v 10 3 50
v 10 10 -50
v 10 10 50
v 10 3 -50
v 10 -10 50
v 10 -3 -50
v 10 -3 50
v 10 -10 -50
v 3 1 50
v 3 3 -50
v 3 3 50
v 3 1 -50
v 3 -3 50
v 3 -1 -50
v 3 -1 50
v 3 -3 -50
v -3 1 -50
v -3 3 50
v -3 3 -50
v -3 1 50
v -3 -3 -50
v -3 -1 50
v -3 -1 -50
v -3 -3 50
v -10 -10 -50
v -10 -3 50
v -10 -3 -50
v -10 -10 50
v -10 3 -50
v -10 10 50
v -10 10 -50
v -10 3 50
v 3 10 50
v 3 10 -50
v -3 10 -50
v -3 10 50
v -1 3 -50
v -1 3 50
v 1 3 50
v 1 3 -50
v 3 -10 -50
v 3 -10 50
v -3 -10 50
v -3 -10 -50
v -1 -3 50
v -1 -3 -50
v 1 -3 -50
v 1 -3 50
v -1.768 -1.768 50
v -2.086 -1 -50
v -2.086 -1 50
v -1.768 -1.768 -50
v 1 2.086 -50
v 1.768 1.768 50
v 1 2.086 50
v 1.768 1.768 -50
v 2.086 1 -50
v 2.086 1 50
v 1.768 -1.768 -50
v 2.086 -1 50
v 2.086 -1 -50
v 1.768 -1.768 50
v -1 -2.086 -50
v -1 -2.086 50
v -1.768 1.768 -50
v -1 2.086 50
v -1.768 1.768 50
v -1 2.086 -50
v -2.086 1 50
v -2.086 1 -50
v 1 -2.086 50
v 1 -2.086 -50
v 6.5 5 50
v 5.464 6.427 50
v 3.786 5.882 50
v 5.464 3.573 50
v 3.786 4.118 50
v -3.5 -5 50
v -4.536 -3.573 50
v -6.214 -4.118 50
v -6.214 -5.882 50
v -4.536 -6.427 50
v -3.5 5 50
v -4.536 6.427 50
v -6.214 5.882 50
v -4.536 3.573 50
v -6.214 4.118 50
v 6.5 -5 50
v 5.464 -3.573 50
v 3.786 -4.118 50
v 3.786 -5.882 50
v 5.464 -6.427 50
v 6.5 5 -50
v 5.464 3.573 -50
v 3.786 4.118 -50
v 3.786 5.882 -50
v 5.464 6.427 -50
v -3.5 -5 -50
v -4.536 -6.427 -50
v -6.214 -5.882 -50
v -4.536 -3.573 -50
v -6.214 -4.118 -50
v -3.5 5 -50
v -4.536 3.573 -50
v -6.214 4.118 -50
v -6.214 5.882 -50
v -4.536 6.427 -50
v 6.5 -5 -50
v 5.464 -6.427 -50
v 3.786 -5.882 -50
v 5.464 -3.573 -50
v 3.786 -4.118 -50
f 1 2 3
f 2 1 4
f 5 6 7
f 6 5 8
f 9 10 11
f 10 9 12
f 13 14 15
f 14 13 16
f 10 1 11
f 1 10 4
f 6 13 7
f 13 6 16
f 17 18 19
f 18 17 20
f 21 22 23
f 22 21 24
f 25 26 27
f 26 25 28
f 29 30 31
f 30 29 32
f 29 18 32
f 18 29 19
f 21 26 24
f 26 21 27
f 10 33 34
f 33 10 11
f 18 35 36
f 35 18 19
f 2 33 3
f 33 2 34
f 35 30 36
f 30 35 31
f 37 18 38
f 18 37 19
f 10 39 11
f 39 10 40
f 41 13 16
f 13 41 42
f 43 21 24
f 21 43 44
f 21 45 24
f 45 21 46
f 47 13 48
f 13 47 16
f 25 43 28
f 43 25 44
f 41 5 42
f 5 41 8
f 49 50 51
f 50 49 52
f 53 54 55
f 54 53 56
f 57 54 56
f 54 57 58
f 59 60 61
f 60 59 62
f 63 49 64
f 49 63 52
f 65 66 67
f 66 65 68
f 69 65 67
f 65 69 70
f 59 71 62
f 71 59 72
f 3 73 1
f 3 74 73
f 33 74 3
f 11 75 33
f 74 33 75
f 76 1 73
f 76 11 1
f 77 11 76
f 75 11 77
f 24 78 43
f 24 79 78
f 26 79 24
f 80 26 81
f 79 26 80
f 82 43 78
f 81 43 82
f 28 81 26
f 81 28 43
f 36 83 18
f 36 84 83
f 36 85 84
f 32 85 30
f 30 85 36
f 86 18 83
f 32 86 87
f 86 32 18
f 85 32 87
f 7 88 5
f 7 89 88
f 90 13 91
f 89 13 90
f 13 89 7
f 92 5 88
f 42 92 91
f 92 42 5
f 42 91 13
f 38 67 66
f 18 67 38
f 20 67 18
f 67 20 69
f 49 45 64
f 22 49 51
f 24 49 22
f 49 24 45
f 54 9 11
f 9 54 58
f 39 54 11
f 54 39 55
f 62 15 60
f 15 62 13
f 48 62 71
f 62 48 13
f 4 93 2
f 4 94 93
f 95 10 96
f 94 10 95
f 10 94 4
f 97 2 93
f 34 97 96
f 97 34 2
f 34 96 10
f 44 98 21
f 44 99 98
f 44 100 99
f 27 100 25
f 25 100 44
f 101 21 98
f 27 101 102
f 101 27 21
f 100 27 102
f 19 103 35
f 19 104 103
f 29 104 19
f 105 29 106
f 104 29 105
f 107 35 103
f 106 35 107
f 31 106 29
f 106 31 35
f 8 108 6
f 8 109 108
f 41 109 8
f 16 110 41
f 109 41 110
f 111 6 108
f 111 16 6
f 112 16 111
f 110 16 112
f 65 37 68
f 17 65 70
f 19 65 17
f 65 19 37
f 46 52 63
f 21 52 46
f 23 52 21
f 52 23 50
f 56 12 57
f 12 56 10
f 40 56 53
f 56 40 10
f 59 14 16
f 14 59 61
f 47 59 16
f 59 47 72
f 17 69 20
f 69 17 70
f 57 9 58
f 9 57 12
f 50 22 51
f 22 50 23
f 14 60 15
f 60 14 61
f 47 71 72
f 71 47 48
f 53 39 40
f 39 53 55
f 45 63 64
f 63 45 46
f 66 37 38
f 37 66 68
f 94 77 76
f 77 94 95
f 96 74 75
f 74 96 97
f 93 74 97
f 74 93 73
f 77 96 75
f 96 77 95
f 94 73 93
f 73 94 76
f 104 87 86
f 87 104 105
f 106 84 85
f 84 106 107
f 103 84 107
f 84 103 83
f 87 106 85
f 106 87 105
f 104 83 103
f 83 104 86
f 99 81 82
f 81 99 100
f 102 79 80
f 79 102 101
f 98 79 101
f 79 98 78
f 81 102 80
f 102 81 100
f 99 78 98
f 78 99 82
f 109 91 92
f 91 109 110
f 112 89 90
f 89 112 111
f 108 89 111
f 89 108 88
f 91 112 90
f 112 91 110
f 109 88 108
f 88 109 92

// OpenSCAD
// Parameters
cross_section_width = 20.0; //[10.0:40.0:0.5]
cross_section_height = 20.0; //[10.0:40.0:0.5]
length = 100.0; //[50.0:200.0:1]
center = 1; //[0:1:1]
cornerHole = 1; //[0:1:1]
wall_thickness = 2.0; //[1.0:4.0:0.25]
slot_opening = 6.0; //[4.0:8.0:0.25]
slot_depth = 6.0; //[4.0:9.0:0.25]
center_bore_diameter = 5.0; //[3.0:8.0:0.25]
web_thickness = 2.0; //[1.0:4.0:0.25]
corner_hole_diameter = 3.0; //[2.0:5.0:0.25]
corner_hole_inset = 5.0; //[3.0:8.0:0.25]
overlap = 1.0; //[0.5:2.0:0.25]

// Extrusion Cross Section
module extrusion_cross_section() {
  color("Silver") {
    difference() {
      cube([cross_section_width, cross_section_height, length], center=true);
      union() {
        translate([cross_section_width/2 - (slot_depth + overlap)/2, 0, 0])
          cube([slot_depth + overlap, slot_opening, length + overlap], center=true);
        translate([-cross_section_width/2 + (slot_depth + overlap)/2, 0, 0])
          cube([slot_depth + overlap, slot_opening, length + overlap], center=true);
        translate([0, cross_section_height/2 - (slot_depth + overlap)/2, 0])
          cube([slot_opening, slot_depth + overlap, length + overlap], center=true);
        translate([0, -cross_section_height/2 + (slot_depth + overlap)/2, 0])
          cube([slot_opening, slot_depth + overlap, length + overlap], center=true);
      }
      union() {
        cylinder(r=center_bore_diameter/2, h=length + overlap, center=true);
        cube([cross_section_width - 2*wall_thickness, web_thickness, length], center=true);
        cube([web_thickness, cross_section_height - 2*wall_thickness, length], center=true);
      }
      if (cornerHole) {
        union() {
          translate([cross_section_width/2 - corner_hole_inset, cross_section_height/2 - corner_hole_inset, 0])
            cylinder(r=corner_hole_diameter/2, h=length + overlap, center=true);
          translate([-cross_section_width/2 + corner_hole_inset, cross_section_height/2 - corner_hole_inset, 0])
            cylinder(r=corner_hole_diameter/2, h=length + overlap, center=true);
          translate([-cross_section_width/2 + corner_hole_inset, -cross_section_height/2 + corner_hole_inset, 0])
            cylinder(r=corner_hole_diameter/2, h=length + overlap, center=true);
          translate([cross_section_width/2 - corner_hole_inset, -cross_section_height/2 + corner_hole_inset, 0])
            cylinder(r=corner_hole_diameter/2, h=length + overlap, center=true);
        }
      }
    }
  }
}

// Box Corner Profile Section
module box_corner_profile_section() {
  color("Silver") {
    union() {
      translate([cross_section_width/2 - wall_thickness/2, cross_section_height/2 - wall_thickness/2, 0])
        cube([wall_thickness, wall_thickness, length], center=true);
      translate([-cross_section_width/2 + wall_thickness/2, cross_section_height/2 - wall_thickness/2, 0])
        cube([wall_thickness, wall_thickness, length], center=true);
      translate([-cross_section_width/2 + wall_thickness/2, -cross_section_height/2 + wall_thickness/2, 0])
        cube([wall_thickness, wall_thickness, length], center=true);
      translate([cross_section_width/2 - wall_thickness/2, -cross_section_height/2 + wall_thickness/2, 0])
        cube([wall_thickness, wall_thickness, length], center=true);
    }
  }
}

// Box Corner Profile Sections
module box_corner_profile_sections() {
  box_corner_profile_section();
}

// Extrusion
module extrusion() {
  union() {
    extrusion_cross_section();
    box_corner_profile_sections();
  }
}

// Assembly
module assembly() {
  extrusion();
}

assembly();
